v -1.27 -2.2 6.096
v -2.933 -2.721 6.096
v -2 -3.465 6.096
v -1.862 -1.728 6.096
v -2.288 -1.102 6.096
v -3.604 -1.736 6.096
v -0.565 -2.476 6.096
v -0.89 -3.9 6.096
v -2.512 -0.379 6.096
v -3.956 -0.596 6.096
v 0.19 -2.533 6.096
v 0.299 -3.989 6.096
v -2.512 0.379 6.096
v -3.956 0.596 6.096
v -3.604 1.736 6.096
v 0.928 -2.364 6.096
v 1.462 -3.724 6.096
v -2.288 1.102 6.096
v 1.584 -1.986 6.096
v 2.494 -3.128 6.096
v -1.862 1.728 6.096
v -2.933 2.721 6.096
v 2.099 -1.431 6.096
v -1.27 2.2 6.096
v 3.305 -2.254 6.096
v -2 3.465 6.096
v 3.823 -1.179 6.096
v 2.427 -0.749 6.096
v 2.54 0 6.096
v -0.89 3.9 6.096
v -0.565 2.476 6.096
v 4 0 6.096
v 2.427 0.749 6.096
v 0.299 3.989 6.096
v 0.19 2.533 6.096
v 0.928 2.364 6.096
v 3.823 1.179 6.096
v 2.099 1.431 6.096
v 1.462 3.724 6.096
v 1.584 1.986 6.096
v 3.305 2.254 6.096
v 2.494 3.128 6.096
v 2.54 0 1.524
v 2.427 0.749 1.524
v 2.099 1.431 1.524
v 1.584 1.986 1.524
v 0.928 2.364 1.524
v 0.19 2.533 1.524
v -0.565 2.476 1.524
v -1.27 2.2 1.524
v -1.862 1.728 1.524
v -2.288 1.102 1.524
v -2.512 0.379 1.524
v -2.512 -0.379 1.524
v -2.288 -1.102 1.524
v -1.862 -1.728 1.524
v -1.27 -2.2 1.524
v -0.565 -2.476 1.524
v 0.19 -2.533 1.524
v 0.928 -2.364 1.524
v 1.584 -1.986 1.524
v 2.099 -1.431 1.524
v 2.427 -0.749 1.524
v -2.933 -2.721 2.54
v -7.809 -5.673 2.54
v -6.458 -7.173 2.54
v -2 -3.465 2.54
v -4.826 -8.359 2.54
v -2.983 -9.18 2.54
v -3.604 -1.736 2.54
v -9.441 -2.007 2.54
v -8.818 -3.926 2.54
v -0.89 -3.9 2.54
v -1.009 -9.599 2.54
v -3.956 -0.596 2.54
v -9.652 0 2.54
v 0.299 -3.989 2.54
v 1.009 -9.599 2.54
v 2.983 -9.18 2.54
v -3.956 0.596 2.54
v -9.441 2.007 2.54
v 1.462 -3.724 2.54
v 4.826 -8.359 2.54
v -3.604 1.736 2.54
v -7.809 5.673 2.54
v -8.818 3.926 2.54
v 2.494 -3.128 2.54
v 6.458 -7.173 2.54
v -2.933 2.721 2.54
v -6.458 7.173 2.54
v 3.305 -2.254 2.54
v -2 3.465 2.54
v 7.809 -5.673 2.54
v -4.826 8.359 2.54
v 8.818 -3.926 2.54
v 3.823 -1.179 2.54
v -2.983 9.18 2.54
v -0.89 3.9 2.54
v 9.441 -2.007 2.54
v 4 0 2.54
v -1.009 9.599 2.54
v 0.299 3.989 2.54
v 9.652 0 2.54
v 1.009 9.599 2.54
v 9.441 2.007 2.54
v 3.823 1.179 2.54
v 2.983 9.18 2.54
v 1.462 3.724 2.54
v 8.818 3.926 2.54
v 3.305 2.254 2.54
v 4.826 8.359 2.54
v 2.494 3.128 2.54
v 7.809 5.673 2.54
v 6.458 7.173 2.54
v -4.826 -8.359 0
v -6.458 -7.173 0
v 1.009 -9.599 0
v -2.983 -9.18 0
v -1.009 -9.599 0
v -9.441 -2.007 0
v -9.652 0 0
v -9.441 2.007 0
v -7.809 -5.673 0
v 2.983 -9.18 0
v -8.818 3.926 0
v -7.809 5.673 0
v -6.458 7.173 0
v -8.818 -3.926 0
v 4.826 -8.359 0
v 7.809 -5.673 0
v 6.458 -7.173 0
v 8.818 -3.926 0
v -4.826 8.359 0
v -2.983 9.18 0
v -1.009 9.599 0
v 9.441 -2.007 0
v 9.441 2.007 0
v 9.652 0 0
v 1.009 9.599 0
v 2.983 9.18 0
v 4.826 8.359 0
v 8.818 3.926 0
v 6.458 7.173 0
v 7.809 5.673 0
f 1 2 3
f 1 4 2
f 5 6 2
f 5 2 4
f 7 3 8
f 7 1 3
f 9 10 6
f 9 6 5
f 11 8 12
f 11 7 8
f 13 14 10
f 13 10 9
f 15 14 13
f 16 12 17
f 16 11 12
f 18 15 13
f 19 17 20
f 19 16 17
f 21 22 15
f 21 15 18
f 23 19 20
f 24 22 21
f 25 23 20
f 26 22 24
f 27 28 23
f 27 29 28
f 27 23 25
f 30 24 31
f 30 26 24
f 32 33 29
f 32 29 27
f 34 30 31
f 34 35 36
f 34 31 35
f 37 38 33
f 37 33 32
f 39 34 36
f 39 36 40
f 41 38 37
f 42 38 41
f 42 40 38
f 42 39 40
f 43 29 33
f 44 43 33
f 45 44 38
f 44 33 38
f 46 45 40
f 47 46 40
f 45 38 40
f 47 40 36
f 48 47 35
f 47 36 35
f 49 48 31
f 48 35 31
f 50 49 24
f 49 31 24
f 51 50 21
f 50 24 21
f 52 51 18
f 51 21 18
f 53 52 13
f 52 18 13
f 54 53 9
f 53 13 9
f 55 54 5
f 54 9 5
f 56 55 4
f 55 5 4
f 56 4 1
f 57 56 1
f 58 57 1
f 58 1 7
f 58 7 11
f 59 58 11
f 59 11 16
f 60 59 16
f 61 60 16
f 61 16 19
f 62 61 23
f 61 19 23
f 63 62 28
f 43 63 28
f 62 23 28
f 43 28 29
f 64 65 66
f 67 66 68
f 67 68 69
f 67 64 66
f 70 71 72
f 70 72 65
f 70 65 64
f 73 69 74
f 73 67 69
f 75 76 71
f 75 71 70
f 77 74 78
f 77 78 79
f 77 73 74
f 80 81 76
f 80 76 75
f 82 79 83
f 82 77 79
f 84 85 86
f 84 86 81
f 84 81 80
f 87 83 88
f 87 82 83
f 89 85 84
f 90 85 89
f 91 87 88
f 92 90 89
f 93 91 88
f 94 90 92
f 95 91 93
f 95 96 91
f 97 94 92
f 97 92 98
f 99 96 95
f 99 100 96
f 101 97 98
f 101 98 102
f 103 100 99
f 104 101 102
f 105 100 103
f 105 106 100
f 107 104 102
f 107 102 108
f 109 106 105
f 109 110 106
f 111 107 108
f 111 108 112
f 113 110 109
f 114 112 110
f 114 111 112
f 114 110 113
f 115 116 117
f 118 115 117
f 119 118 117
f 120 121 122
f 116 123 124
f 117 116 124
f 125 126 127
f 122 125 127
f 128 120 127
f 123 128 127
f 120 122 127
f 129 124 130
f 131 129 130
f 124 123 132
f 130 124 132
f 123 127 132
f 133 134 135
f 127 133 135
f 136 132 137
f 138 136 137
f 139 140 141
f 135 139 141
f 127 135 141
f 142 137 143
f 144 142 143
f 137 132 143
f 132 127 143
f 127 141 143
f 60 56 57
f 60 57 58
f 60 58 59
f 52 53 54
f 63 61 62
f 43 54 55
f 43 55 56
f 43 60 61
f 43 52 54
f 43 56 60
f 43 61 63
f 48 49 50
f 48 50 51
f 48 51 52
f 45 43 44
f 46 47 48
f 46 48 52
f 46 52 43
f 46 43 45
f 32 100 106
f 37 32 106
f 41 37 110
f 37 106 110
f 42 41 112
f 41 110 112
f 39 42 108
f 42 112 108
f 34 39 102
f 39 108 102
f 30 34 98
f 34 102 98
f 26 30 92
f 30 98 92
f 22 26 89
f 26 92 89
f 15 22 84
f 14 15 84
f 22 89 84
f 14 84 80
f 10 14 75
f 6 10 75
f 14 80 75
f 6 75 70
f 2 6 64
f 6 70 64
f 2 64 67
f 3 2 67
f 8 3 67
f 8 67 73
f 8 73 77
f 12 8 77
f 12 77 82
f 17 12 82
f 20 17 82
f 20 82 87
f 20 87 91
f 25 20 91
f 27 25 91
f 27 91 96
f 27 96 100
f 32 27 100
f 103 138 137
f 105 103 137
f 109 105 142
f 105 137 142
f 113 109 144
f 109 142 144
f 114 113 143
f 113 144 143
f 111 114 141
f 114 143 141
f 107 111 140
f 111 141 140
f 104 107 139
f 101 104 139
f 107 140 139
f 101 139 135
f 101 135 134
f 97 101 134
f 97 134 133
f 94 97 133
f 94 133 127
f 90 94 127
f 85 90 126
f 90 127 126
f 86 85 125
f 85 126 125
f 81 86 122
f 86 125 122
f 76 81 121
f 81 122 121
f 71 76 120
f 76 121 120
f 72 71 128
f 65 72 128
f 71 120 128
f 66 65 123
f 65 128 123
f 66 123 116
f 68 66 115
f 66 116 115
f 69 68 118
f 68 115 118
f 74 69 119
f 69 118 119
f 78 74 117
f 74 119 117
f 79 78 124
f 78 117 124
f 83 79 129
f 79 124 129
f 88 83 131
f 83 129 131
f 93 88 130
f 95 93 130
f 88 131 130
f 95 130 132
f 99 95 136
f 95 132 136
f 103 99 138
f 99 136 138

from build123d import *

# Parameters (mm, degrees)
F0_R     = 9.652
F0_R_2   = 3.8735
F1_DEPTH = 2.54
F2_R     = 4.0005
F3_DEPTH = 6.096
F4_R     = 2.54
F5_DEPTH = 4.572


with BuildPart() as f1:
    # F0 (on Top) → F1 (new body)
    with BuildSketch(Plane.XY):
        Circle(F0_R)
        Circle(F0_R_2, mode=Mode.SUBTRACT)
    extrude(amount=F1_DEPTH)

    # F2 (on Top) → F3 (join)
    with BuildSketch(Plane.XY):
        Circle(F2_R)
    extrude(amount=F3_DEPTH)

    # F4 (on face) → F5 (cut)
    with BuildSketch(Plane.XY.offset(6.096)):
        Circle(F4_R)
    extrude(amount=-F5_DEPTH, mode=Mode.SUBTRACT)


solid = f1.part
